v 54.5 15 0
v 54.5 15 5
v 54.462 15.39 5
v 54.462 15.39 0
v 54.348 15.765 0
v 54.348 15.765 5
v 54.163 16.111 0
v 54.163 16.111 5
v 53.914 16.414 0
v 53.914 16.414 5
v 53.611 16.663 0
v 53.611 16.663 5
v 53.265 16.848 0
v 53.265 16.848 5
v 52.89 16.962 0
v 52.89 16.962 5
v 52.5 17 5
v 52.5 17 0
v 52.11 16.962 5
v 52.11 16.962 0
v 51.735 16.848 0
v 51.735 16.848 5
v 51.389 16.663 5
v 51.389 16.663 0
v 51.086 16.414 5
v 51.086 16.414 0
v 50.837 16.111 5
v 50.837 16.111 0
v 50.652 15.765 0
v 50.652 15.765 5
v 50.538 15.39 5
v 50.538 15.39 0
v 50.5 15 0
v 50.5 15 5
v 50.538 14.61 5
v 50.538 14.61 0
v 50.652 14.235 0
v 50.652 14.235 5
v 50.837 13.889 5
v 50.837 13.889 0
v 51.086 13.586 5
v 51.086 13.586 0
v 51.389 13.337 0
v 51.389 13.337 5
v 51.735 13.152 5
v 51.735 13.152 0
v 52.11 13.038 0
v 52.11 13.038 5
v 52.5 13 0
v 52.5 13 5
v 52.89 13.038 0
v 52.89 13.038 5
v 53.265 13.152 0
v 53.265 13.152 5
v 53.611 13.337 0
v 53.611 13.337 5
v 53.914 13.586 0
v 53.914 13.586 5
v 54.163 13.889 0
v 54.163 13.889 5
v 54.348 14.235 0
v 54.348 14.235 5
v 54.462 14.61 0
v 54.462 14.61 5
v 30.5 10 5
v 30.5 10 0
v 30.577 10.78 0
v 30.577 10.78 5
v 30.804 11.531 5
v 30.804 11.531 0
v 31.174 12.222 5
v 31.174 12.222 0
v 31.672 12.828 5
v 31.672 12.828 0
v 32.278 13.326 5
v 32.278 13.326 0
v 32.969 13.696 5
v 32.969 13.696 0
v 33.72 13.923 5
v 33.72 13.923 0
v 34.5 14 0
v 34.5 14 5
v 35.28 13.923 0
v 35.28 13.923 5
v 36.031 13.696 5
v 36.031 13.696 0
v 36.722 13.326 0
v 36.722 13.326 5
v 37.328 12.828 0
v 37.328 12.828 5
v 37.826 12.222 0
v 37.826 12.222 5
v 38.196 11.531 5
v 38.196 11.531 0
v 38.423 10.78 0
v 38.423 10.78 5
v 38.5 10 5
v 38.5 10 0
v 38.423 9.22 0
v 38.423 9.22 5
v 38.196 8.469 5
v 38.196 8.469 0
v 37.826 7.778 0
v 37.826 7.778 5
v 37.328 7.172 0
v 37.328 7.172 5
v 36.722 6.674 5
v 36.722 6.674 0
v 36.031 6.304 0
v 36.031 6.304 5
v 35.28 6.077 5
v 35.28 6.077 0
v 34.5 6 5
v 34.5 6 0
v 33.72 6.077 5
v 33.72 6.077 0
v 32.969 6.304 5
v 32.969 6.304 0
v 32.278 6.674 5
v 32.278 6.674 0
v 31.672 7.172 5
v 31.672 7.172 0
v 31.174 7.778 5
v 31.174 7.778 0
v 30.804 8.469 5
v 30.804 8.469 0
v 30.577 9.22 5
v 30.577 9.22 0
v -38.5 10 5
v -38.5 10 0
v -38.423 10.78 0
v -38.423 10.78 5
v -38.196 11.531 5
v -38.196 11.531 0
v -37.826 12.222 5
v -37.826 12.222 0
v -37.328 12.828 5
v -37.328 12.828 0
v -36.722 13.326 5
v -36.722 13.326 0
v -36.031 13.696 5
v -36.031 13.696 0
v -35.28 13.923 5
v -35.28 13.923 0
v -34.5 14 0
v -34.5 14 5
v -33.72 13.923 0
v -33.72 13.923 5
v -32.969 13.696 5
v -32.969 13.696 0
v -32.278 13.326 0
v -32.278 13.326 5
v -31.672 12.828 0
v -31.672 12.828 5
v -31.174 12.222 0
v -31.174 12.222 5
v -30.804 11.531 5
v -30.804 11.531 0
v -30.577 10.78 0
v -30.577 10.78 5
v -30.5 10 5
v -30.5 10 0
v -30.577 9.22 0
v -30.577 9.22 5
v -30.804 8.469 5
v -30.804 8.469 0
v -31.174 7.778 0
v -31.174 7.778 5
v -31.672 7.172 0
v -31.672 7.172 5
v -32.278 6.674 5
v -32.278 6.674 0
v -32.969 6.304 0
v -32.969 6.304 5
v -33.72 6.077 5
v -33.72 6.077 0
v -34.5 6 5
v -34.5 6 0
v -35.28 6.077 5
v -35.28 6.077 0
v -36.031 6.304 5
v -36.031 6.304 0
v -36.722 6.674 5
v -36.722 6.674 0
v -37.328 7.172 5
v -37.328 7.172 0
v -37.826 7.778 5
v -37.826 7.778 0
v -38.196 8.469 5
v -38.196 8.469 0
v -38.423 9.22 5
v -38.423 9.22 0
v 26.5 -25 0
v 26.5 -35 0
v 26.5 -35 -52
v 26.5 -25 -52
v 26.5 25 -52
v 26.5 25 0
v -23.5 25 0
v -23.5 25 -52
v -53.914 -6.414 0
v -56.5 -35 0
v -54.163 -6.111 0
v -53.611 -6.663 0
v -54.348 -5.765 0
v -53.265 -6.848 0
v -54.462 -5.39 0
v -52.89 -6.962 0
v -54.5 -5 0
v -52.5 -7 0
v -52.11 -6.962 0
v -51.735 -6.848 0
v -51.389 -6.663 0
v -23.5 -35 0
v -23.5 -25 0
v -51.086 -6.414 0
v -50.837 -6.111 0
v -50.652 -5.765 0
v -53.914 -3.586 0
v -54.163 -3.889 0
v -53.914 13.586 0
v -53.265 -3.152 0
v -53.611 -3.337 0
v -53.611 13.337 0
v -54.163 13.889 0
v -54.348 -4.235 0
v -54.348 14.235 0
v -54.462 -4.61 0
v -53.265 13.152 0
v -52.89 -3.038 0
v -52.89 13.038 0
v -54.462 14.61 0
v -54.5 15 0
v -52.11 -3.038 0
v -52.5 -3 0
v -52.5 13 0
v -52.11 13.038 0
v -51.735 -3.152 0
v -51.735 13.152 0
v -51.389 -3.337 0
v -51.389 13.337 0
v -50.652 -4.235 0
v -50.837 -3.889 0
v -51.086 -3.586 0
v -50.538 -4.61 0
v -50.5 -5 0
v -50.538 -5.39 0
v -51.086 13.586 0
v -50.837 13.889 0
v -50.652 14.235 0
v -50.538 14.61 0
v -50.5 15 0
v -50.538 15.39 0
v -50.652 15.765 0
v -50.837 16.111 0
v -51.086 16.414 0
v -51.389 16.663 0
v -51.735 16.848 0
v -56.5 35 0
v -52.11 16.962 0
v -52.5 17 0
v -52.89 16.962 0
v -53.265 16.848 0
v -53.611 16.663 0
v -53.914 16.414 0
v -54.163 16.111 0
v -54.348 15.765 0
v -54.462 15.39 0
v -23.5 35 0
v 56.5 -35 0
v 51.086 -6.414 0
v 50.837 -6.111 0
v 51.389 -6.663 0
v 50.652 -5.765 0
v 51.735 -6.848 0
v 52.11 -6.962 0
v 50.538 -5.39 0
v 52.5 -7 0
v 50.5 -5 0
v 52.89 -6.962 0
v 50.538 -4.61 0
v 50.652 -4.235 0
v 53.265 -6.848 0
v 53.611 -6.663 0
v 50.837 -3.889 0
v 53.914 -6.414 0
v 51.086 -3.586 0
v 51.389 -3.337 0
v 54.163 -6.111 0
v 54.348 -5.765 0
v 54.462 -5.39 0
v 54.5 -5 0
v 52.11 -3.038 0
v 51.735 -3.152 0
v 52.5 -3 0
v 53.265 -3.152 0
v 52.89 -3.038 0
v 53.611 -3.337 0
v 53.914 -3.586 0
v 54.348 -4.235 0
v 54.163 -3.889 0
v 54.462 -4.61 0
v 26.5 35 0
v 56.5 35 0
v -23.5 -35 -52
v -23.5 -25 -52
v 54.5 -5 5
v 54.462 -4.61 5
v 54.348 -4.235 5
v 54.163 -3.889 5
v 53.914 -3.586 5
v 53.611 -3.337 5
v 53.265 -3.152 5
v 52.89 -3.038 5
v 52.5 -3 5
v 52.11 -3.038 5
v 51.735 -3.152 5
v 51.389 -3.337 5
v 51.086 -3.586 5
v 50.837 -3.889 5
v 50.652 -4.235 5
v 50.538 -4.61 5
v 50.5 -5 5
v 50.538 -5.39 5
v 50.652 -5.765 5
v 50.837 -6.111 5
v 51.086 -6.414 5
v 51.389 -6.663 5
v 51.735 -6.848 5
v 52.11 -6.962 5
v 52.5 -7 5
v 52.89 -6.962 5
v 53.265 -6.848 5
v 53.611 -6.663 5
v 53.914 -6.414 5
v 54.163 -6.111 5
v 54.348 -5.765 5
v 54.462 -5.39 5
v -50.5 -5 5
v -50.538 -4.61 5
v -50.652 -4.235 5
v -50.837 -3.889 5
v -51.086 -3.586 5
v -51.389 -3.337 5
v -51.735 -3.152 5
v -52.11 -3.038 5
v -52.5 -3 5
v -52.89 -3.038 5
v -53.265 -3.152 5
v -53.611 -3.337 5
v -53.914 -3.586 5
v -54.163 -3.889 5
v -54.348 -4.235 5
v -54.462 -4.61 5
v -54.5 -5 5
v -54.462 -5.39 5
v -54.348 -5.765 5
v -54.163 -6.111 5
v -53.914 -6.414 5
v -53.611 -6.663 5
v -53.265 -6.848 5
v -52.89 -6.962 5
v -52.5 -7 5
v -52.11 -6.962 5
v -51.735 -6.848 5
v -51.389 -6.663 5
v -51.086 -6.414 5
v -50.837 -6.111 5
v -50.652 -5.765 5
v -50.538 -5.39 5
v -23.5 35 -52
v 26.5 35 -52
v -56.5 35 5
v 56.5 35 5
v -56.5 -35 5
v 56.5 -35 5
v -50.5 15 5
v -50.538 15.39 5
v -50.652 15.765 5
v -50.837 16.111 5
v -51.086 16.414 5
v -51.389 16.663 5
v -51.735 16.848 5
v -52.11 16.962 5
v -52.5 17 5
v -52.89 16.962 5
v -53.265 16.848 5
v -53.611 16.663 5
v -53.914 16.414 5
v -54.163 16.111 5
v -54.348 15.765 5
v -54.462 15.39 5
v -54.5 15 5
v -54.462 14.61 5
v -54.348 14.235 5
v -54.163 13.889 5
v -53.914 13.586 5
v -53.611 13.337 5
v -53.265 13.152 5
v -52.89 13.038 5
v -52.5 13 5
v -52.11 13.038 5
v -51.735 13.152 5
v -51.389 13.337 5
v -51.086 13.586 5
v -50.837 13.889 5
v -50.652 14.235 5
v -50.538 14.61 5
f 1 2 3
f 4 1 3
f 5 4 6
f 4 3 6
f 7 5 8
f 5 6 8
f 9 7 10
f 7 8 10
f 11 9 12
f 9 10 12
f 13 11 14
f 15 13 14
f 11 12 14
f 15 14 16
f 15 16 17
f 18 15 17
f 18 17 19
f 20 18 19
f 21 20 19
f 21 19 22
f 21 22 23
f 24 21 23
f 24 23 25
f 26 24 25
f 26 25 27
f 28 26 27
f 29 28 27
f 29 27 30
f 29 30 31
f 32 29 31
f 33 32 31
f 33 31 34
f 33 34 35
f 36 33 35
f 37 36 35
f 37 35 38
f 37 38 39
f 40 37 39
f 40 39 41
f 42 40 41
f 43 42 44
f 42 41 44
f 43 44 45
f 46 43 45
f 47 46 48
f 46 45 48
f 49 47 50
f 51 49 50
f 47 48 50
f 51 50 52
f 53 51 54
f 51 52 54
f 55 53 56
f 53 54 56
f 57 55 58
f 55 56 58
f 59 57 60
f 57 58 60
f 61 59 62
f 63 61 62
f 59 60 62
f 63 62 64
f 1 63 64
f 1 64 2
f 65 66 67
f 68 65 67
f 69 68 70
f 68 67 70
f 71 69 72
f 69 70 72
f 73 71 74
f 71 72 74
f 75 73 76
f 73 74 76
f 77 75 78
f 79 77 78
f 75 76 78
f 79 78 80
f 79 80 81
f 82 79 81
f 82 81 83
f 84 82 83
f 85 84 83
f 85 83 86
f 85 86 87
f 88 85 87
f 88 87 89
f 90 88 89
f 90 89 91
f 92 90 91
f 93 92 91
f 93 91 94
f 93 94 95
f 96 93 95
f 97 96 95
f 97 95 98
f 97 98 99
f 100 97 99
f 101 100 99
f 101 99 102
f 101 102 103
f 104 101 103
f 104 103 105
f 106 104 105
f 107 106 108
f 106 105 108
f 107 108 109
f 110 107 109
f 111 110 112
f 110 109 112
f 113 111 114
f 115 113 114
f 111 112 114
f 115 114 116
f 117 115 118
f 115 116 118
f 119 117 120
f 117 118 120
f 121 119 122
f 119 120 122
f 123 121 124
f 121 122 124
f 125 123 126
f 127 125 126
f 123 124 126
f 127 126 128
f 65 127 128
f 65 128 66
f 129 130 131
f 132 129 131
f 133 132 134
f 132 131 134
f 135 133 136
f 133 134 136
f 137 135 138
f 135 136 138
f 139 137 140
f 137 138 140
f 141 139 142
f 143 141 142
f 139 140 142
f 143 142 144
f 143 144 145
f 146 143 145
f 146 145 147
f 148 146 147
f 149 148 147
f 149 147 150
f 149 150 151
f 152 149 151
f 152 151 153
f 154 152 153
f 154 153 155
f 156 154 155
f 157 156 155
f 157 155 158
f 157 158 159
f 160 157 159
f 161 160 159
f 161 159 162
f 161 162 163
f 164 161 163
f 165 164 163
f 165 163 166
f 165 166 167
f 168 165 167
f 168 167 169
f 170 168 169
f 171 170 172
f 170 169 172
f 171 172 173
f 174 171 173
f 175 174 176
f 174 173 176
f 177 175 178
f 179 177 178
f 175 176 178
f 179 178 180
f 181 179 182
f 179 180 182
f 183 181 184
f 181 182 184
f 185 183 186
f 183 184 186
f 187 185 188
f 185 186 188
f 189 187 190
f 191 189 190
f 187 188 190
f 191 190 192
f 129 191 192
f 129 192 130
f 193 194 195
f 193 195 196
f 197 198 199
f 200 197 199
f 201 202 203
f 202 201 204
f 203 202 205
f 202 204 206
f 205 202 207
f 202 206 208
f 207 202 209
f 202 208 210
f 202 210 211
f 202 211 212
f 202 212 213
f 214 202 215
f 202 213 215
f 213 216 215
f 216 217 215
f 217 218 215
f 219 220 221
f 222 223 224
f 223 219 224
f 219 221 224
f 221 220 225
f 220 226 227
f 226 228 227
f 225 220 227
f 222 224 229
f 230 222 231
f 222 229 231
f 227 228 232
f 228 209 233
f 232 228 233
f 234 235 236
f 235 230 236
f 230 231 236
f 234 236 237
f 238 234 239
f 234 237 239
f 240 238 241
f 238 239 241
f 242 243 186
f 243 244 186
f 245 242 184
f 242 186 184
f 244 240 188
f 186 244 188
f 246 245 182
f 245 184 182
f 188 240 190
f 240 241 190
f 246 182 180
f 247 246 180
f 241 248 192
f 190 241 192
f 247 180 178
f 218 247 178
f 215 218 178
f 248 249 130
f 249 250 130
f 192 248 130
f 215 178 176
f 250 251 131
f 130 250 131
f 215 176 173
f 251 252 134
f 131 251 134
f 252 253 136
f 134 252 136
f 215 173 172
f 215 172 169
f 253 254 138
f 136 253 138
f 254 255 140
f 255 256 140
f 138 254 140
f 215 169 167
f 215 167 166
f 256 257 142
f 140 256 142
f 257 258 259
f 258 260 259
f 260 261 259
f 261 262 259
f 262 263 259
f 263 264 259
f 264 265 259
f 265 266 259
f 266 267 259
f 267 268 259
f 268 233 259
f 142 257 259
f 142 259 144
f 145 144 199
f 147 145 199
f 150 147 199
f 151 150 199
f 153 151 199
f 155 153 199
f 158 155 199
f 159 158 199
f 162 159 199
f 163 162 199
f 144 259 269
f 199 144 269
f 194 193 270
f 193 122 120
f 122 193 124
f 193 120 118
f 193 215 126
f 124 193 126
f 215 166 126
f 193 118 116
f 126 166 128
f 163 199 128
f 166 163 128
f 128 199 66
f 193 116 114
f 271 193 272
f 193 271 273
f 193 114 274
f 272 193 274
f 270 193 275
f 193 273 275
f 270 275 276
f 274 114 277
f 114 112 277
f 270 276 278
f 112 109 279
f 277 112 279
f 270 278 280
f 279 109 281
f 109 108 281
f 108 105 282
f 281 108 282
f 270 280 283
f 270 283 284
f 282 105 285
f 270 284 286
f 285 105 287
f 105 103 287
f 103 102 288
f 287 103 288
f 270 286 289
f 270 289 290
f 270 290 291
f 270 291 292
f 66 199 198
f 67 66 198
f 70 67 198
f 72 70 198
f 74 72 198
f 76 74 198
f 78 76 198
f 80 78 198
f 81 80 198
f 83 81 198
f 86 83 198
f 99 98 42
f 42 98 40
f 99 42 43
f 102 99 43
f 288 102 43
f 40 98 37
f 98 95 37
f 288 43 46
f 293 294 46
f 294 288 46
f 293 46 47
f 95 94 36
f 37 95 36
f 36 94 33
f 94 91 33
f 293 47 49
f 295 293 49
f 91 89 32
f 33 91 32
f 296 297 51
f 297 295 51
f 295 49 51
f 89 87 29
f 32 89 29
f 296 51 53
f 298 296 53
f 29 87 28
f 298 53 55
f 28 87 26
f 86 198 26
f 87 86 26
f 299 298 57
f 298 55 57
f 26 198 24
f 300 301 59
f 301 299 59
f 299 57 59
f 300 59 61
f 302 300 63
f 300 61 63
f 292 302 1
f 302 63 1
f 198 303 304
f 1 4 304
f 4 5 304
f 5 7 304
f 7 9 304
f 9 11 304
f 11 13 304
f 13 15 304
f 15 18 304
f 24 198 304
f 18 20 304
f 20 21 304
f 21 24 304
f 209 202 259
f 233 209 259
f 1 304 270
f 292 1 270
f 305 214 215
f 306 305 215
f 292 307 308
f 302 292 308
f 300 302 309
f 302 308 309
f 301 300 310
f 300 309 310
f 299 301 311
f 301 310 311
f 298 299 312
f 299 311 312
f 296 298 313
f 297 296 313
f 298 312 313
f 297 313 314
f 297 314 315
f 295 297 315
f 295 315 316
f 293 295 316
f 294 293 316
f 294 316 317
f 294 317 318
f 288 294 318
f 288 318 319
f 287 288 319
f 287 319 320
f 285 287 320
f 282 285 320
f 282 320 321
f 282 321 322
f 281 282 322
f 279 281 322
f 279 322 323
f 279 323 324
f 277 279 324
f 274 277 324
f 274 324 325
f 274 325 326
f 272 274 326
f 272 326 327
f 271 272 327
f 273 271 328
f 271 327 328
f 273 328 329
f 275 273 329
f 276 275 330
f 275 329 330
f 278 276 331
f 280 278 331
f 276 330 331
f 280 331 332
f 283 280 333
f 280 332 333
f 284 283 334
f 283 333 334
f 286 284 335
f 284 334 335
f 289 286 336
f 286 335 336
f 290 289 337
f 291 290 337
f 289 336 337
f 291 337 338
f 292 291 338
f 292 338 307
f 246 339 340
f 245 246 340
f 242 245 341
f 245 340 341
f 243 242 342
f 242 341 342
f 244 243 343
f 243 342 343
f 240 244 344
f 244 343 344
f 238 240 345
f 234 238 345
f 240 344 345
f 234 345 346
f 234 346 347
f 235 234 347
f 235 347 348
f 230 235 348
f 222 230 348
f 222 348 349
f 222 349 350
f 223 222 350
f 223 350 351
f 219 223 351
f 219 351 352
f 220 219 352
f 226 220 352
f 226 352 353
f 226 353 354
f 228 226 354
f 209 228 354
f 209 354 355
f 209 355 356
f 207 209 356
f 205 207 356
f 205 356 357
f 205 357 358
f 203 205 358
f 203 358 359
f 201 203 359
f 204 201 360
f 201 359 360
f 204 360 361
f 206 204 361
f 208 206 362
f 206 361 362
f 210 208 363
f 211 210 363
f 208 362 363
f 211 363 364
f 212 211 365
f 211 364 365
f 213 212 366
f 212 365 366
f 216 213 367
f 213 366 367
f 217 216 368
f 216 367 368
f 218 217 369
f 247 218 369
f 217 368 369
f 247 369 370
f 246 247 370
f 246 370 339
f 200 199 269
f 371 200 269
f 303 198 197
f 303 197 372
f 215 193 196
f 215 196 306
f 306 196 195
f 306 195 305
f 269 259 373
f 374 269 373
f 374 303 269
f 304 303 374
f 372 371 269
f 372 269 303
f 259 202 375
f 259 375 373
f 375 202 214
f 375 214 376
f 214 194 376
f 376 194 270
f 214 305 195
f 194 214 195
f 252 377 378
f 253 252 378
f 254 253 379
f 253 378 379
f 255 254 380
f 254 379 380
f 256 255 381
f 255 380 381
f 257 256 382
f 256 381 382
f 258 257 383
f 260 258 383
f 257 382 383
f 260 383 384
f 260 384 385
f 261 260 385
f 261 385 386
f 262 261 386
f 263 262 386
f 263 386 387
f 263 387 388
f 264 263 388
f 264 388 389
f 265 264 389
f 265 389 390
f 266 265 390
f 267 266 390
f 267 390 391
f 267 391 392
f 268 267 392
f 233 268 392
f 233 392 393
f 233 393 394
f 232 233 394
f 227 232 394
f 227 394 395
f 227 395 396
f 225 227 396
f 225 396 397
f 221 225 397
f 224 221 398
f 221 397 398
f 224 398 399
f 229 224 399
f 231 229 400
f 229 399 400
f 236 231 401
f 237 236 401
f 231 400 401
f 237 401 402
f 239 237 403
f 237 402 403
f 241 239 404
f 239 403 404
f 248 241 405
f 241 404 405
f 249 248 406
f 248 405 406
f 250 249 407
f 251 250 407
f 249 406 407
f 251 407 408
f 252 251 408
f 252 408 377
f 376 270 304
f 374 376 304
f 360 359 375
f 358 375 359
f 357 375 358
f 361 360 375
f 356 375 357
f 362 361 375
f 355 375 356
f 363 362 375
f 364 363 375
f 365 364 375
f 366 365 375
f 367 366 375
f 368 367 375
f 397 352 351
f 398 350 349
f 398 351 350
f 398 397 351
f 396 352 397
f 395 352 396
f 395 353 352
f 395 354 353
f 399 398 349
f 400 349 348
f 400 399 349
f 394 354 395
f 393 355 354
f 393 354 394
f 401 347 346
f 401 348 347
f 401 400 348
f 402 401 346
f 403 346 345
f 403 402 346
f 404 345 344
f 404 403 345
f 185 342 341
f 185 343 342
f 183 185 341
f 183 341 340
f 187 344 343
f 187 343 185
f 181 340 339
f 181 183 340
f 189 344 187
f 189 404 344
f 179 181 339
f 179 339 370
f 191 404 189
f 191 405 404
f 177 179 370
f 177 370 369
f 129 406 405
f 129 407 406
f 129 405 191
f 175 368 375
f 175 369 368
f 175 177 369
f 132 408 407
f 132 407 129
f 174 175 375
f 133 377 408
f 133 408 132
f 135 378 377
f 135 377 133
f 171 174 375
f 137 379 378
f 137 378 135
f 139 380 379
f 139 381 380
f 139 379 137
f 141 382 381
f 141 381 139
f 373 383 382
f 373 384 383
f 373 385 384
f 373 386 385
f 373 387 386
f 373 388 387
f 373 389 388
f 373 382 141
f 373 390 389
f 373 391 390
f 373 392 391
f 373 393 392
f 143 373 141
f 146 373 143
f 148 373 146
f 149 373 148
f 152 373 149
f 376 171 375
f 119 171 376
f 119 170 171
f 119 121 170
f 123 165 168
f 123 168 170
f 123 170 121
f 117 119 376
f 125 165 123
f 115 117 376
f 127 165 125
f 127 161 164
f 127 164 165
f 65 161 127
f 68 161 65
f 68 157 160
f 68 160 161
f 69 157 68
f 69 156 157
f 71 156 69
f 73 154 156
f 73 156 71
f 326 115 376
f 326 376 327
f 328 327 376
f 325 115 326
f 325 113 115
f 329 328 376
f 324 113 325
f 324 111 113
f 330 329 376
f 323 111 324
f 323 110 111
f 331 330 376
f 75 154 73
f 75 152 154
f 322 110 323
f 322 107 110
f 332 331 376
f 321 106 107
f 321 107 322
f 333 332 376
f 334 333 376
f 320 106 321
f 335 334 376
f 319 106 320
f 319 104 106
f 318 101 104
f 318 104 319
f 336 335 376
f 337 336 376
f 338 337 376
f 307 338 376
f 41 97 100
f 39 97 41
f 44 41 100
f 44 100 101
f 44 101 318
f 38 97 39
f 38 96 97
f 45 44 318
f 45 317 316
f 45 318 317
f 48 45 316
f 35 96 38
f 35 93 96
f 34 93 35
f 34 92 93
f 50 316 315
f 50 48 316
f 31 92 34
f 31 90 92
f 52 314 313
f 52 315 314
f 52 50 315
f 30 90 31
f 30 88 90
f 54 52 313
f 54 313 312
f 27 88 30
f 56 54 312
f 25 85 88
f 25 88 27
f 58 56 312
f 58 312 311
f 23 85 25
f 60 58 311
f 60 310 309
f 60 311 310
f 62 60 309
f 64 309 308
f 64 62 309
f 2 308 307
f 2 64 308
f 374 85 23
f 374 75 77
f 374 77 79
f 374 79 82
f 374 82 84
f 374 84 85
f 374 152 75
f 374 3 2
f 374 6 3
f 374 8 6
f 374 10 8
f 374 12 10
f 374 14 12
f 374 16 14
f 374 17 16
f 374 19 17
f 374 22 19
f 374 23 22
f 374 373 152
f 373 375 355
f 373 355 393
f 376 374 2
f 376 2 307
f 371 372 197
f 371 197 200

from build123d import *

# Parameters (mm, degrees)
SKETCH_1_W          = 113
SKETCH_1_H          = 70
EXTRUDE_1_DEPTH     = 5
SKETCH_2_W          = 50
SKETCH_2_H          = 10
EXTRUDE_2_DEPTH     = 52
SKETCH_3_R          = 4
CUT_EXTRUDE_1_DEPTH = 85.387499074
SKETCH_5_R          = 2
CUT_EXTRUDE_2_DEPTH = 88.55712421


with BuildPart() as part:
    # 草图1 → 凸台-拉伸1 (new body)
    with BuildSketch(Plane.XY):
        Rectangle(SKETCH_1_W, SKETCH_1_H)
    extrude(amount=EXTRUDE_1_DEPTH)

    # 草图2 → 凸台-拉伸2 (add)
    with BuildSketch(Plane(origin=(0, 0, 0), x_dir=(-1, 0, 0), z_dir=(0, 0, -1))):
        with Locations((-1.5, -30)):
            Rectangle(SKETCH_2_W, SKETCH_2_H)
        with Locations((-1.5, 30)):
            Rectangle(SKETCH_2_W, SKETCH_2_H)
    extrude(amount=EXTRUDE_2_DEPTH)

    # 草图3 → 切除-拉伸1 (cut, through all)
    with BuildSketch(Plane(origin=(0, 0, 0), x_dir=(-1, 0, 0), z_dir=(0, 0, -1))):
        with Locations((-34.5, 10)):
            Circle(SKETCH_3_R)
        with Locations((34.5, 10)):
            Circle(SKETCH_3_R)
    extrude(amount=-CUT_EXTRUDE_1_DEPTH, mode=Mode.SUBTRACT)

    # 草图5 → 切除-拉伸2 (cut, through all)
    with BuildSketch(Plane.XY.offset(5)):
        with Locations((-52.5, 15)):
            Circle(SKETCH_5_R)
        with Locations((52.5, 15)):
            Circle(SKETCH_5_R)
        with Locations((52.5, -5)):
            Circle(SKETCH_5_R)
        with Locations((-52.5, -5)):
            Circle(SKETCH_5_R)
    extrude(amount=-CUT_EXTRUDE_2_DEPTH, mode=Mode.SUBTRACT)


solid = part.part
